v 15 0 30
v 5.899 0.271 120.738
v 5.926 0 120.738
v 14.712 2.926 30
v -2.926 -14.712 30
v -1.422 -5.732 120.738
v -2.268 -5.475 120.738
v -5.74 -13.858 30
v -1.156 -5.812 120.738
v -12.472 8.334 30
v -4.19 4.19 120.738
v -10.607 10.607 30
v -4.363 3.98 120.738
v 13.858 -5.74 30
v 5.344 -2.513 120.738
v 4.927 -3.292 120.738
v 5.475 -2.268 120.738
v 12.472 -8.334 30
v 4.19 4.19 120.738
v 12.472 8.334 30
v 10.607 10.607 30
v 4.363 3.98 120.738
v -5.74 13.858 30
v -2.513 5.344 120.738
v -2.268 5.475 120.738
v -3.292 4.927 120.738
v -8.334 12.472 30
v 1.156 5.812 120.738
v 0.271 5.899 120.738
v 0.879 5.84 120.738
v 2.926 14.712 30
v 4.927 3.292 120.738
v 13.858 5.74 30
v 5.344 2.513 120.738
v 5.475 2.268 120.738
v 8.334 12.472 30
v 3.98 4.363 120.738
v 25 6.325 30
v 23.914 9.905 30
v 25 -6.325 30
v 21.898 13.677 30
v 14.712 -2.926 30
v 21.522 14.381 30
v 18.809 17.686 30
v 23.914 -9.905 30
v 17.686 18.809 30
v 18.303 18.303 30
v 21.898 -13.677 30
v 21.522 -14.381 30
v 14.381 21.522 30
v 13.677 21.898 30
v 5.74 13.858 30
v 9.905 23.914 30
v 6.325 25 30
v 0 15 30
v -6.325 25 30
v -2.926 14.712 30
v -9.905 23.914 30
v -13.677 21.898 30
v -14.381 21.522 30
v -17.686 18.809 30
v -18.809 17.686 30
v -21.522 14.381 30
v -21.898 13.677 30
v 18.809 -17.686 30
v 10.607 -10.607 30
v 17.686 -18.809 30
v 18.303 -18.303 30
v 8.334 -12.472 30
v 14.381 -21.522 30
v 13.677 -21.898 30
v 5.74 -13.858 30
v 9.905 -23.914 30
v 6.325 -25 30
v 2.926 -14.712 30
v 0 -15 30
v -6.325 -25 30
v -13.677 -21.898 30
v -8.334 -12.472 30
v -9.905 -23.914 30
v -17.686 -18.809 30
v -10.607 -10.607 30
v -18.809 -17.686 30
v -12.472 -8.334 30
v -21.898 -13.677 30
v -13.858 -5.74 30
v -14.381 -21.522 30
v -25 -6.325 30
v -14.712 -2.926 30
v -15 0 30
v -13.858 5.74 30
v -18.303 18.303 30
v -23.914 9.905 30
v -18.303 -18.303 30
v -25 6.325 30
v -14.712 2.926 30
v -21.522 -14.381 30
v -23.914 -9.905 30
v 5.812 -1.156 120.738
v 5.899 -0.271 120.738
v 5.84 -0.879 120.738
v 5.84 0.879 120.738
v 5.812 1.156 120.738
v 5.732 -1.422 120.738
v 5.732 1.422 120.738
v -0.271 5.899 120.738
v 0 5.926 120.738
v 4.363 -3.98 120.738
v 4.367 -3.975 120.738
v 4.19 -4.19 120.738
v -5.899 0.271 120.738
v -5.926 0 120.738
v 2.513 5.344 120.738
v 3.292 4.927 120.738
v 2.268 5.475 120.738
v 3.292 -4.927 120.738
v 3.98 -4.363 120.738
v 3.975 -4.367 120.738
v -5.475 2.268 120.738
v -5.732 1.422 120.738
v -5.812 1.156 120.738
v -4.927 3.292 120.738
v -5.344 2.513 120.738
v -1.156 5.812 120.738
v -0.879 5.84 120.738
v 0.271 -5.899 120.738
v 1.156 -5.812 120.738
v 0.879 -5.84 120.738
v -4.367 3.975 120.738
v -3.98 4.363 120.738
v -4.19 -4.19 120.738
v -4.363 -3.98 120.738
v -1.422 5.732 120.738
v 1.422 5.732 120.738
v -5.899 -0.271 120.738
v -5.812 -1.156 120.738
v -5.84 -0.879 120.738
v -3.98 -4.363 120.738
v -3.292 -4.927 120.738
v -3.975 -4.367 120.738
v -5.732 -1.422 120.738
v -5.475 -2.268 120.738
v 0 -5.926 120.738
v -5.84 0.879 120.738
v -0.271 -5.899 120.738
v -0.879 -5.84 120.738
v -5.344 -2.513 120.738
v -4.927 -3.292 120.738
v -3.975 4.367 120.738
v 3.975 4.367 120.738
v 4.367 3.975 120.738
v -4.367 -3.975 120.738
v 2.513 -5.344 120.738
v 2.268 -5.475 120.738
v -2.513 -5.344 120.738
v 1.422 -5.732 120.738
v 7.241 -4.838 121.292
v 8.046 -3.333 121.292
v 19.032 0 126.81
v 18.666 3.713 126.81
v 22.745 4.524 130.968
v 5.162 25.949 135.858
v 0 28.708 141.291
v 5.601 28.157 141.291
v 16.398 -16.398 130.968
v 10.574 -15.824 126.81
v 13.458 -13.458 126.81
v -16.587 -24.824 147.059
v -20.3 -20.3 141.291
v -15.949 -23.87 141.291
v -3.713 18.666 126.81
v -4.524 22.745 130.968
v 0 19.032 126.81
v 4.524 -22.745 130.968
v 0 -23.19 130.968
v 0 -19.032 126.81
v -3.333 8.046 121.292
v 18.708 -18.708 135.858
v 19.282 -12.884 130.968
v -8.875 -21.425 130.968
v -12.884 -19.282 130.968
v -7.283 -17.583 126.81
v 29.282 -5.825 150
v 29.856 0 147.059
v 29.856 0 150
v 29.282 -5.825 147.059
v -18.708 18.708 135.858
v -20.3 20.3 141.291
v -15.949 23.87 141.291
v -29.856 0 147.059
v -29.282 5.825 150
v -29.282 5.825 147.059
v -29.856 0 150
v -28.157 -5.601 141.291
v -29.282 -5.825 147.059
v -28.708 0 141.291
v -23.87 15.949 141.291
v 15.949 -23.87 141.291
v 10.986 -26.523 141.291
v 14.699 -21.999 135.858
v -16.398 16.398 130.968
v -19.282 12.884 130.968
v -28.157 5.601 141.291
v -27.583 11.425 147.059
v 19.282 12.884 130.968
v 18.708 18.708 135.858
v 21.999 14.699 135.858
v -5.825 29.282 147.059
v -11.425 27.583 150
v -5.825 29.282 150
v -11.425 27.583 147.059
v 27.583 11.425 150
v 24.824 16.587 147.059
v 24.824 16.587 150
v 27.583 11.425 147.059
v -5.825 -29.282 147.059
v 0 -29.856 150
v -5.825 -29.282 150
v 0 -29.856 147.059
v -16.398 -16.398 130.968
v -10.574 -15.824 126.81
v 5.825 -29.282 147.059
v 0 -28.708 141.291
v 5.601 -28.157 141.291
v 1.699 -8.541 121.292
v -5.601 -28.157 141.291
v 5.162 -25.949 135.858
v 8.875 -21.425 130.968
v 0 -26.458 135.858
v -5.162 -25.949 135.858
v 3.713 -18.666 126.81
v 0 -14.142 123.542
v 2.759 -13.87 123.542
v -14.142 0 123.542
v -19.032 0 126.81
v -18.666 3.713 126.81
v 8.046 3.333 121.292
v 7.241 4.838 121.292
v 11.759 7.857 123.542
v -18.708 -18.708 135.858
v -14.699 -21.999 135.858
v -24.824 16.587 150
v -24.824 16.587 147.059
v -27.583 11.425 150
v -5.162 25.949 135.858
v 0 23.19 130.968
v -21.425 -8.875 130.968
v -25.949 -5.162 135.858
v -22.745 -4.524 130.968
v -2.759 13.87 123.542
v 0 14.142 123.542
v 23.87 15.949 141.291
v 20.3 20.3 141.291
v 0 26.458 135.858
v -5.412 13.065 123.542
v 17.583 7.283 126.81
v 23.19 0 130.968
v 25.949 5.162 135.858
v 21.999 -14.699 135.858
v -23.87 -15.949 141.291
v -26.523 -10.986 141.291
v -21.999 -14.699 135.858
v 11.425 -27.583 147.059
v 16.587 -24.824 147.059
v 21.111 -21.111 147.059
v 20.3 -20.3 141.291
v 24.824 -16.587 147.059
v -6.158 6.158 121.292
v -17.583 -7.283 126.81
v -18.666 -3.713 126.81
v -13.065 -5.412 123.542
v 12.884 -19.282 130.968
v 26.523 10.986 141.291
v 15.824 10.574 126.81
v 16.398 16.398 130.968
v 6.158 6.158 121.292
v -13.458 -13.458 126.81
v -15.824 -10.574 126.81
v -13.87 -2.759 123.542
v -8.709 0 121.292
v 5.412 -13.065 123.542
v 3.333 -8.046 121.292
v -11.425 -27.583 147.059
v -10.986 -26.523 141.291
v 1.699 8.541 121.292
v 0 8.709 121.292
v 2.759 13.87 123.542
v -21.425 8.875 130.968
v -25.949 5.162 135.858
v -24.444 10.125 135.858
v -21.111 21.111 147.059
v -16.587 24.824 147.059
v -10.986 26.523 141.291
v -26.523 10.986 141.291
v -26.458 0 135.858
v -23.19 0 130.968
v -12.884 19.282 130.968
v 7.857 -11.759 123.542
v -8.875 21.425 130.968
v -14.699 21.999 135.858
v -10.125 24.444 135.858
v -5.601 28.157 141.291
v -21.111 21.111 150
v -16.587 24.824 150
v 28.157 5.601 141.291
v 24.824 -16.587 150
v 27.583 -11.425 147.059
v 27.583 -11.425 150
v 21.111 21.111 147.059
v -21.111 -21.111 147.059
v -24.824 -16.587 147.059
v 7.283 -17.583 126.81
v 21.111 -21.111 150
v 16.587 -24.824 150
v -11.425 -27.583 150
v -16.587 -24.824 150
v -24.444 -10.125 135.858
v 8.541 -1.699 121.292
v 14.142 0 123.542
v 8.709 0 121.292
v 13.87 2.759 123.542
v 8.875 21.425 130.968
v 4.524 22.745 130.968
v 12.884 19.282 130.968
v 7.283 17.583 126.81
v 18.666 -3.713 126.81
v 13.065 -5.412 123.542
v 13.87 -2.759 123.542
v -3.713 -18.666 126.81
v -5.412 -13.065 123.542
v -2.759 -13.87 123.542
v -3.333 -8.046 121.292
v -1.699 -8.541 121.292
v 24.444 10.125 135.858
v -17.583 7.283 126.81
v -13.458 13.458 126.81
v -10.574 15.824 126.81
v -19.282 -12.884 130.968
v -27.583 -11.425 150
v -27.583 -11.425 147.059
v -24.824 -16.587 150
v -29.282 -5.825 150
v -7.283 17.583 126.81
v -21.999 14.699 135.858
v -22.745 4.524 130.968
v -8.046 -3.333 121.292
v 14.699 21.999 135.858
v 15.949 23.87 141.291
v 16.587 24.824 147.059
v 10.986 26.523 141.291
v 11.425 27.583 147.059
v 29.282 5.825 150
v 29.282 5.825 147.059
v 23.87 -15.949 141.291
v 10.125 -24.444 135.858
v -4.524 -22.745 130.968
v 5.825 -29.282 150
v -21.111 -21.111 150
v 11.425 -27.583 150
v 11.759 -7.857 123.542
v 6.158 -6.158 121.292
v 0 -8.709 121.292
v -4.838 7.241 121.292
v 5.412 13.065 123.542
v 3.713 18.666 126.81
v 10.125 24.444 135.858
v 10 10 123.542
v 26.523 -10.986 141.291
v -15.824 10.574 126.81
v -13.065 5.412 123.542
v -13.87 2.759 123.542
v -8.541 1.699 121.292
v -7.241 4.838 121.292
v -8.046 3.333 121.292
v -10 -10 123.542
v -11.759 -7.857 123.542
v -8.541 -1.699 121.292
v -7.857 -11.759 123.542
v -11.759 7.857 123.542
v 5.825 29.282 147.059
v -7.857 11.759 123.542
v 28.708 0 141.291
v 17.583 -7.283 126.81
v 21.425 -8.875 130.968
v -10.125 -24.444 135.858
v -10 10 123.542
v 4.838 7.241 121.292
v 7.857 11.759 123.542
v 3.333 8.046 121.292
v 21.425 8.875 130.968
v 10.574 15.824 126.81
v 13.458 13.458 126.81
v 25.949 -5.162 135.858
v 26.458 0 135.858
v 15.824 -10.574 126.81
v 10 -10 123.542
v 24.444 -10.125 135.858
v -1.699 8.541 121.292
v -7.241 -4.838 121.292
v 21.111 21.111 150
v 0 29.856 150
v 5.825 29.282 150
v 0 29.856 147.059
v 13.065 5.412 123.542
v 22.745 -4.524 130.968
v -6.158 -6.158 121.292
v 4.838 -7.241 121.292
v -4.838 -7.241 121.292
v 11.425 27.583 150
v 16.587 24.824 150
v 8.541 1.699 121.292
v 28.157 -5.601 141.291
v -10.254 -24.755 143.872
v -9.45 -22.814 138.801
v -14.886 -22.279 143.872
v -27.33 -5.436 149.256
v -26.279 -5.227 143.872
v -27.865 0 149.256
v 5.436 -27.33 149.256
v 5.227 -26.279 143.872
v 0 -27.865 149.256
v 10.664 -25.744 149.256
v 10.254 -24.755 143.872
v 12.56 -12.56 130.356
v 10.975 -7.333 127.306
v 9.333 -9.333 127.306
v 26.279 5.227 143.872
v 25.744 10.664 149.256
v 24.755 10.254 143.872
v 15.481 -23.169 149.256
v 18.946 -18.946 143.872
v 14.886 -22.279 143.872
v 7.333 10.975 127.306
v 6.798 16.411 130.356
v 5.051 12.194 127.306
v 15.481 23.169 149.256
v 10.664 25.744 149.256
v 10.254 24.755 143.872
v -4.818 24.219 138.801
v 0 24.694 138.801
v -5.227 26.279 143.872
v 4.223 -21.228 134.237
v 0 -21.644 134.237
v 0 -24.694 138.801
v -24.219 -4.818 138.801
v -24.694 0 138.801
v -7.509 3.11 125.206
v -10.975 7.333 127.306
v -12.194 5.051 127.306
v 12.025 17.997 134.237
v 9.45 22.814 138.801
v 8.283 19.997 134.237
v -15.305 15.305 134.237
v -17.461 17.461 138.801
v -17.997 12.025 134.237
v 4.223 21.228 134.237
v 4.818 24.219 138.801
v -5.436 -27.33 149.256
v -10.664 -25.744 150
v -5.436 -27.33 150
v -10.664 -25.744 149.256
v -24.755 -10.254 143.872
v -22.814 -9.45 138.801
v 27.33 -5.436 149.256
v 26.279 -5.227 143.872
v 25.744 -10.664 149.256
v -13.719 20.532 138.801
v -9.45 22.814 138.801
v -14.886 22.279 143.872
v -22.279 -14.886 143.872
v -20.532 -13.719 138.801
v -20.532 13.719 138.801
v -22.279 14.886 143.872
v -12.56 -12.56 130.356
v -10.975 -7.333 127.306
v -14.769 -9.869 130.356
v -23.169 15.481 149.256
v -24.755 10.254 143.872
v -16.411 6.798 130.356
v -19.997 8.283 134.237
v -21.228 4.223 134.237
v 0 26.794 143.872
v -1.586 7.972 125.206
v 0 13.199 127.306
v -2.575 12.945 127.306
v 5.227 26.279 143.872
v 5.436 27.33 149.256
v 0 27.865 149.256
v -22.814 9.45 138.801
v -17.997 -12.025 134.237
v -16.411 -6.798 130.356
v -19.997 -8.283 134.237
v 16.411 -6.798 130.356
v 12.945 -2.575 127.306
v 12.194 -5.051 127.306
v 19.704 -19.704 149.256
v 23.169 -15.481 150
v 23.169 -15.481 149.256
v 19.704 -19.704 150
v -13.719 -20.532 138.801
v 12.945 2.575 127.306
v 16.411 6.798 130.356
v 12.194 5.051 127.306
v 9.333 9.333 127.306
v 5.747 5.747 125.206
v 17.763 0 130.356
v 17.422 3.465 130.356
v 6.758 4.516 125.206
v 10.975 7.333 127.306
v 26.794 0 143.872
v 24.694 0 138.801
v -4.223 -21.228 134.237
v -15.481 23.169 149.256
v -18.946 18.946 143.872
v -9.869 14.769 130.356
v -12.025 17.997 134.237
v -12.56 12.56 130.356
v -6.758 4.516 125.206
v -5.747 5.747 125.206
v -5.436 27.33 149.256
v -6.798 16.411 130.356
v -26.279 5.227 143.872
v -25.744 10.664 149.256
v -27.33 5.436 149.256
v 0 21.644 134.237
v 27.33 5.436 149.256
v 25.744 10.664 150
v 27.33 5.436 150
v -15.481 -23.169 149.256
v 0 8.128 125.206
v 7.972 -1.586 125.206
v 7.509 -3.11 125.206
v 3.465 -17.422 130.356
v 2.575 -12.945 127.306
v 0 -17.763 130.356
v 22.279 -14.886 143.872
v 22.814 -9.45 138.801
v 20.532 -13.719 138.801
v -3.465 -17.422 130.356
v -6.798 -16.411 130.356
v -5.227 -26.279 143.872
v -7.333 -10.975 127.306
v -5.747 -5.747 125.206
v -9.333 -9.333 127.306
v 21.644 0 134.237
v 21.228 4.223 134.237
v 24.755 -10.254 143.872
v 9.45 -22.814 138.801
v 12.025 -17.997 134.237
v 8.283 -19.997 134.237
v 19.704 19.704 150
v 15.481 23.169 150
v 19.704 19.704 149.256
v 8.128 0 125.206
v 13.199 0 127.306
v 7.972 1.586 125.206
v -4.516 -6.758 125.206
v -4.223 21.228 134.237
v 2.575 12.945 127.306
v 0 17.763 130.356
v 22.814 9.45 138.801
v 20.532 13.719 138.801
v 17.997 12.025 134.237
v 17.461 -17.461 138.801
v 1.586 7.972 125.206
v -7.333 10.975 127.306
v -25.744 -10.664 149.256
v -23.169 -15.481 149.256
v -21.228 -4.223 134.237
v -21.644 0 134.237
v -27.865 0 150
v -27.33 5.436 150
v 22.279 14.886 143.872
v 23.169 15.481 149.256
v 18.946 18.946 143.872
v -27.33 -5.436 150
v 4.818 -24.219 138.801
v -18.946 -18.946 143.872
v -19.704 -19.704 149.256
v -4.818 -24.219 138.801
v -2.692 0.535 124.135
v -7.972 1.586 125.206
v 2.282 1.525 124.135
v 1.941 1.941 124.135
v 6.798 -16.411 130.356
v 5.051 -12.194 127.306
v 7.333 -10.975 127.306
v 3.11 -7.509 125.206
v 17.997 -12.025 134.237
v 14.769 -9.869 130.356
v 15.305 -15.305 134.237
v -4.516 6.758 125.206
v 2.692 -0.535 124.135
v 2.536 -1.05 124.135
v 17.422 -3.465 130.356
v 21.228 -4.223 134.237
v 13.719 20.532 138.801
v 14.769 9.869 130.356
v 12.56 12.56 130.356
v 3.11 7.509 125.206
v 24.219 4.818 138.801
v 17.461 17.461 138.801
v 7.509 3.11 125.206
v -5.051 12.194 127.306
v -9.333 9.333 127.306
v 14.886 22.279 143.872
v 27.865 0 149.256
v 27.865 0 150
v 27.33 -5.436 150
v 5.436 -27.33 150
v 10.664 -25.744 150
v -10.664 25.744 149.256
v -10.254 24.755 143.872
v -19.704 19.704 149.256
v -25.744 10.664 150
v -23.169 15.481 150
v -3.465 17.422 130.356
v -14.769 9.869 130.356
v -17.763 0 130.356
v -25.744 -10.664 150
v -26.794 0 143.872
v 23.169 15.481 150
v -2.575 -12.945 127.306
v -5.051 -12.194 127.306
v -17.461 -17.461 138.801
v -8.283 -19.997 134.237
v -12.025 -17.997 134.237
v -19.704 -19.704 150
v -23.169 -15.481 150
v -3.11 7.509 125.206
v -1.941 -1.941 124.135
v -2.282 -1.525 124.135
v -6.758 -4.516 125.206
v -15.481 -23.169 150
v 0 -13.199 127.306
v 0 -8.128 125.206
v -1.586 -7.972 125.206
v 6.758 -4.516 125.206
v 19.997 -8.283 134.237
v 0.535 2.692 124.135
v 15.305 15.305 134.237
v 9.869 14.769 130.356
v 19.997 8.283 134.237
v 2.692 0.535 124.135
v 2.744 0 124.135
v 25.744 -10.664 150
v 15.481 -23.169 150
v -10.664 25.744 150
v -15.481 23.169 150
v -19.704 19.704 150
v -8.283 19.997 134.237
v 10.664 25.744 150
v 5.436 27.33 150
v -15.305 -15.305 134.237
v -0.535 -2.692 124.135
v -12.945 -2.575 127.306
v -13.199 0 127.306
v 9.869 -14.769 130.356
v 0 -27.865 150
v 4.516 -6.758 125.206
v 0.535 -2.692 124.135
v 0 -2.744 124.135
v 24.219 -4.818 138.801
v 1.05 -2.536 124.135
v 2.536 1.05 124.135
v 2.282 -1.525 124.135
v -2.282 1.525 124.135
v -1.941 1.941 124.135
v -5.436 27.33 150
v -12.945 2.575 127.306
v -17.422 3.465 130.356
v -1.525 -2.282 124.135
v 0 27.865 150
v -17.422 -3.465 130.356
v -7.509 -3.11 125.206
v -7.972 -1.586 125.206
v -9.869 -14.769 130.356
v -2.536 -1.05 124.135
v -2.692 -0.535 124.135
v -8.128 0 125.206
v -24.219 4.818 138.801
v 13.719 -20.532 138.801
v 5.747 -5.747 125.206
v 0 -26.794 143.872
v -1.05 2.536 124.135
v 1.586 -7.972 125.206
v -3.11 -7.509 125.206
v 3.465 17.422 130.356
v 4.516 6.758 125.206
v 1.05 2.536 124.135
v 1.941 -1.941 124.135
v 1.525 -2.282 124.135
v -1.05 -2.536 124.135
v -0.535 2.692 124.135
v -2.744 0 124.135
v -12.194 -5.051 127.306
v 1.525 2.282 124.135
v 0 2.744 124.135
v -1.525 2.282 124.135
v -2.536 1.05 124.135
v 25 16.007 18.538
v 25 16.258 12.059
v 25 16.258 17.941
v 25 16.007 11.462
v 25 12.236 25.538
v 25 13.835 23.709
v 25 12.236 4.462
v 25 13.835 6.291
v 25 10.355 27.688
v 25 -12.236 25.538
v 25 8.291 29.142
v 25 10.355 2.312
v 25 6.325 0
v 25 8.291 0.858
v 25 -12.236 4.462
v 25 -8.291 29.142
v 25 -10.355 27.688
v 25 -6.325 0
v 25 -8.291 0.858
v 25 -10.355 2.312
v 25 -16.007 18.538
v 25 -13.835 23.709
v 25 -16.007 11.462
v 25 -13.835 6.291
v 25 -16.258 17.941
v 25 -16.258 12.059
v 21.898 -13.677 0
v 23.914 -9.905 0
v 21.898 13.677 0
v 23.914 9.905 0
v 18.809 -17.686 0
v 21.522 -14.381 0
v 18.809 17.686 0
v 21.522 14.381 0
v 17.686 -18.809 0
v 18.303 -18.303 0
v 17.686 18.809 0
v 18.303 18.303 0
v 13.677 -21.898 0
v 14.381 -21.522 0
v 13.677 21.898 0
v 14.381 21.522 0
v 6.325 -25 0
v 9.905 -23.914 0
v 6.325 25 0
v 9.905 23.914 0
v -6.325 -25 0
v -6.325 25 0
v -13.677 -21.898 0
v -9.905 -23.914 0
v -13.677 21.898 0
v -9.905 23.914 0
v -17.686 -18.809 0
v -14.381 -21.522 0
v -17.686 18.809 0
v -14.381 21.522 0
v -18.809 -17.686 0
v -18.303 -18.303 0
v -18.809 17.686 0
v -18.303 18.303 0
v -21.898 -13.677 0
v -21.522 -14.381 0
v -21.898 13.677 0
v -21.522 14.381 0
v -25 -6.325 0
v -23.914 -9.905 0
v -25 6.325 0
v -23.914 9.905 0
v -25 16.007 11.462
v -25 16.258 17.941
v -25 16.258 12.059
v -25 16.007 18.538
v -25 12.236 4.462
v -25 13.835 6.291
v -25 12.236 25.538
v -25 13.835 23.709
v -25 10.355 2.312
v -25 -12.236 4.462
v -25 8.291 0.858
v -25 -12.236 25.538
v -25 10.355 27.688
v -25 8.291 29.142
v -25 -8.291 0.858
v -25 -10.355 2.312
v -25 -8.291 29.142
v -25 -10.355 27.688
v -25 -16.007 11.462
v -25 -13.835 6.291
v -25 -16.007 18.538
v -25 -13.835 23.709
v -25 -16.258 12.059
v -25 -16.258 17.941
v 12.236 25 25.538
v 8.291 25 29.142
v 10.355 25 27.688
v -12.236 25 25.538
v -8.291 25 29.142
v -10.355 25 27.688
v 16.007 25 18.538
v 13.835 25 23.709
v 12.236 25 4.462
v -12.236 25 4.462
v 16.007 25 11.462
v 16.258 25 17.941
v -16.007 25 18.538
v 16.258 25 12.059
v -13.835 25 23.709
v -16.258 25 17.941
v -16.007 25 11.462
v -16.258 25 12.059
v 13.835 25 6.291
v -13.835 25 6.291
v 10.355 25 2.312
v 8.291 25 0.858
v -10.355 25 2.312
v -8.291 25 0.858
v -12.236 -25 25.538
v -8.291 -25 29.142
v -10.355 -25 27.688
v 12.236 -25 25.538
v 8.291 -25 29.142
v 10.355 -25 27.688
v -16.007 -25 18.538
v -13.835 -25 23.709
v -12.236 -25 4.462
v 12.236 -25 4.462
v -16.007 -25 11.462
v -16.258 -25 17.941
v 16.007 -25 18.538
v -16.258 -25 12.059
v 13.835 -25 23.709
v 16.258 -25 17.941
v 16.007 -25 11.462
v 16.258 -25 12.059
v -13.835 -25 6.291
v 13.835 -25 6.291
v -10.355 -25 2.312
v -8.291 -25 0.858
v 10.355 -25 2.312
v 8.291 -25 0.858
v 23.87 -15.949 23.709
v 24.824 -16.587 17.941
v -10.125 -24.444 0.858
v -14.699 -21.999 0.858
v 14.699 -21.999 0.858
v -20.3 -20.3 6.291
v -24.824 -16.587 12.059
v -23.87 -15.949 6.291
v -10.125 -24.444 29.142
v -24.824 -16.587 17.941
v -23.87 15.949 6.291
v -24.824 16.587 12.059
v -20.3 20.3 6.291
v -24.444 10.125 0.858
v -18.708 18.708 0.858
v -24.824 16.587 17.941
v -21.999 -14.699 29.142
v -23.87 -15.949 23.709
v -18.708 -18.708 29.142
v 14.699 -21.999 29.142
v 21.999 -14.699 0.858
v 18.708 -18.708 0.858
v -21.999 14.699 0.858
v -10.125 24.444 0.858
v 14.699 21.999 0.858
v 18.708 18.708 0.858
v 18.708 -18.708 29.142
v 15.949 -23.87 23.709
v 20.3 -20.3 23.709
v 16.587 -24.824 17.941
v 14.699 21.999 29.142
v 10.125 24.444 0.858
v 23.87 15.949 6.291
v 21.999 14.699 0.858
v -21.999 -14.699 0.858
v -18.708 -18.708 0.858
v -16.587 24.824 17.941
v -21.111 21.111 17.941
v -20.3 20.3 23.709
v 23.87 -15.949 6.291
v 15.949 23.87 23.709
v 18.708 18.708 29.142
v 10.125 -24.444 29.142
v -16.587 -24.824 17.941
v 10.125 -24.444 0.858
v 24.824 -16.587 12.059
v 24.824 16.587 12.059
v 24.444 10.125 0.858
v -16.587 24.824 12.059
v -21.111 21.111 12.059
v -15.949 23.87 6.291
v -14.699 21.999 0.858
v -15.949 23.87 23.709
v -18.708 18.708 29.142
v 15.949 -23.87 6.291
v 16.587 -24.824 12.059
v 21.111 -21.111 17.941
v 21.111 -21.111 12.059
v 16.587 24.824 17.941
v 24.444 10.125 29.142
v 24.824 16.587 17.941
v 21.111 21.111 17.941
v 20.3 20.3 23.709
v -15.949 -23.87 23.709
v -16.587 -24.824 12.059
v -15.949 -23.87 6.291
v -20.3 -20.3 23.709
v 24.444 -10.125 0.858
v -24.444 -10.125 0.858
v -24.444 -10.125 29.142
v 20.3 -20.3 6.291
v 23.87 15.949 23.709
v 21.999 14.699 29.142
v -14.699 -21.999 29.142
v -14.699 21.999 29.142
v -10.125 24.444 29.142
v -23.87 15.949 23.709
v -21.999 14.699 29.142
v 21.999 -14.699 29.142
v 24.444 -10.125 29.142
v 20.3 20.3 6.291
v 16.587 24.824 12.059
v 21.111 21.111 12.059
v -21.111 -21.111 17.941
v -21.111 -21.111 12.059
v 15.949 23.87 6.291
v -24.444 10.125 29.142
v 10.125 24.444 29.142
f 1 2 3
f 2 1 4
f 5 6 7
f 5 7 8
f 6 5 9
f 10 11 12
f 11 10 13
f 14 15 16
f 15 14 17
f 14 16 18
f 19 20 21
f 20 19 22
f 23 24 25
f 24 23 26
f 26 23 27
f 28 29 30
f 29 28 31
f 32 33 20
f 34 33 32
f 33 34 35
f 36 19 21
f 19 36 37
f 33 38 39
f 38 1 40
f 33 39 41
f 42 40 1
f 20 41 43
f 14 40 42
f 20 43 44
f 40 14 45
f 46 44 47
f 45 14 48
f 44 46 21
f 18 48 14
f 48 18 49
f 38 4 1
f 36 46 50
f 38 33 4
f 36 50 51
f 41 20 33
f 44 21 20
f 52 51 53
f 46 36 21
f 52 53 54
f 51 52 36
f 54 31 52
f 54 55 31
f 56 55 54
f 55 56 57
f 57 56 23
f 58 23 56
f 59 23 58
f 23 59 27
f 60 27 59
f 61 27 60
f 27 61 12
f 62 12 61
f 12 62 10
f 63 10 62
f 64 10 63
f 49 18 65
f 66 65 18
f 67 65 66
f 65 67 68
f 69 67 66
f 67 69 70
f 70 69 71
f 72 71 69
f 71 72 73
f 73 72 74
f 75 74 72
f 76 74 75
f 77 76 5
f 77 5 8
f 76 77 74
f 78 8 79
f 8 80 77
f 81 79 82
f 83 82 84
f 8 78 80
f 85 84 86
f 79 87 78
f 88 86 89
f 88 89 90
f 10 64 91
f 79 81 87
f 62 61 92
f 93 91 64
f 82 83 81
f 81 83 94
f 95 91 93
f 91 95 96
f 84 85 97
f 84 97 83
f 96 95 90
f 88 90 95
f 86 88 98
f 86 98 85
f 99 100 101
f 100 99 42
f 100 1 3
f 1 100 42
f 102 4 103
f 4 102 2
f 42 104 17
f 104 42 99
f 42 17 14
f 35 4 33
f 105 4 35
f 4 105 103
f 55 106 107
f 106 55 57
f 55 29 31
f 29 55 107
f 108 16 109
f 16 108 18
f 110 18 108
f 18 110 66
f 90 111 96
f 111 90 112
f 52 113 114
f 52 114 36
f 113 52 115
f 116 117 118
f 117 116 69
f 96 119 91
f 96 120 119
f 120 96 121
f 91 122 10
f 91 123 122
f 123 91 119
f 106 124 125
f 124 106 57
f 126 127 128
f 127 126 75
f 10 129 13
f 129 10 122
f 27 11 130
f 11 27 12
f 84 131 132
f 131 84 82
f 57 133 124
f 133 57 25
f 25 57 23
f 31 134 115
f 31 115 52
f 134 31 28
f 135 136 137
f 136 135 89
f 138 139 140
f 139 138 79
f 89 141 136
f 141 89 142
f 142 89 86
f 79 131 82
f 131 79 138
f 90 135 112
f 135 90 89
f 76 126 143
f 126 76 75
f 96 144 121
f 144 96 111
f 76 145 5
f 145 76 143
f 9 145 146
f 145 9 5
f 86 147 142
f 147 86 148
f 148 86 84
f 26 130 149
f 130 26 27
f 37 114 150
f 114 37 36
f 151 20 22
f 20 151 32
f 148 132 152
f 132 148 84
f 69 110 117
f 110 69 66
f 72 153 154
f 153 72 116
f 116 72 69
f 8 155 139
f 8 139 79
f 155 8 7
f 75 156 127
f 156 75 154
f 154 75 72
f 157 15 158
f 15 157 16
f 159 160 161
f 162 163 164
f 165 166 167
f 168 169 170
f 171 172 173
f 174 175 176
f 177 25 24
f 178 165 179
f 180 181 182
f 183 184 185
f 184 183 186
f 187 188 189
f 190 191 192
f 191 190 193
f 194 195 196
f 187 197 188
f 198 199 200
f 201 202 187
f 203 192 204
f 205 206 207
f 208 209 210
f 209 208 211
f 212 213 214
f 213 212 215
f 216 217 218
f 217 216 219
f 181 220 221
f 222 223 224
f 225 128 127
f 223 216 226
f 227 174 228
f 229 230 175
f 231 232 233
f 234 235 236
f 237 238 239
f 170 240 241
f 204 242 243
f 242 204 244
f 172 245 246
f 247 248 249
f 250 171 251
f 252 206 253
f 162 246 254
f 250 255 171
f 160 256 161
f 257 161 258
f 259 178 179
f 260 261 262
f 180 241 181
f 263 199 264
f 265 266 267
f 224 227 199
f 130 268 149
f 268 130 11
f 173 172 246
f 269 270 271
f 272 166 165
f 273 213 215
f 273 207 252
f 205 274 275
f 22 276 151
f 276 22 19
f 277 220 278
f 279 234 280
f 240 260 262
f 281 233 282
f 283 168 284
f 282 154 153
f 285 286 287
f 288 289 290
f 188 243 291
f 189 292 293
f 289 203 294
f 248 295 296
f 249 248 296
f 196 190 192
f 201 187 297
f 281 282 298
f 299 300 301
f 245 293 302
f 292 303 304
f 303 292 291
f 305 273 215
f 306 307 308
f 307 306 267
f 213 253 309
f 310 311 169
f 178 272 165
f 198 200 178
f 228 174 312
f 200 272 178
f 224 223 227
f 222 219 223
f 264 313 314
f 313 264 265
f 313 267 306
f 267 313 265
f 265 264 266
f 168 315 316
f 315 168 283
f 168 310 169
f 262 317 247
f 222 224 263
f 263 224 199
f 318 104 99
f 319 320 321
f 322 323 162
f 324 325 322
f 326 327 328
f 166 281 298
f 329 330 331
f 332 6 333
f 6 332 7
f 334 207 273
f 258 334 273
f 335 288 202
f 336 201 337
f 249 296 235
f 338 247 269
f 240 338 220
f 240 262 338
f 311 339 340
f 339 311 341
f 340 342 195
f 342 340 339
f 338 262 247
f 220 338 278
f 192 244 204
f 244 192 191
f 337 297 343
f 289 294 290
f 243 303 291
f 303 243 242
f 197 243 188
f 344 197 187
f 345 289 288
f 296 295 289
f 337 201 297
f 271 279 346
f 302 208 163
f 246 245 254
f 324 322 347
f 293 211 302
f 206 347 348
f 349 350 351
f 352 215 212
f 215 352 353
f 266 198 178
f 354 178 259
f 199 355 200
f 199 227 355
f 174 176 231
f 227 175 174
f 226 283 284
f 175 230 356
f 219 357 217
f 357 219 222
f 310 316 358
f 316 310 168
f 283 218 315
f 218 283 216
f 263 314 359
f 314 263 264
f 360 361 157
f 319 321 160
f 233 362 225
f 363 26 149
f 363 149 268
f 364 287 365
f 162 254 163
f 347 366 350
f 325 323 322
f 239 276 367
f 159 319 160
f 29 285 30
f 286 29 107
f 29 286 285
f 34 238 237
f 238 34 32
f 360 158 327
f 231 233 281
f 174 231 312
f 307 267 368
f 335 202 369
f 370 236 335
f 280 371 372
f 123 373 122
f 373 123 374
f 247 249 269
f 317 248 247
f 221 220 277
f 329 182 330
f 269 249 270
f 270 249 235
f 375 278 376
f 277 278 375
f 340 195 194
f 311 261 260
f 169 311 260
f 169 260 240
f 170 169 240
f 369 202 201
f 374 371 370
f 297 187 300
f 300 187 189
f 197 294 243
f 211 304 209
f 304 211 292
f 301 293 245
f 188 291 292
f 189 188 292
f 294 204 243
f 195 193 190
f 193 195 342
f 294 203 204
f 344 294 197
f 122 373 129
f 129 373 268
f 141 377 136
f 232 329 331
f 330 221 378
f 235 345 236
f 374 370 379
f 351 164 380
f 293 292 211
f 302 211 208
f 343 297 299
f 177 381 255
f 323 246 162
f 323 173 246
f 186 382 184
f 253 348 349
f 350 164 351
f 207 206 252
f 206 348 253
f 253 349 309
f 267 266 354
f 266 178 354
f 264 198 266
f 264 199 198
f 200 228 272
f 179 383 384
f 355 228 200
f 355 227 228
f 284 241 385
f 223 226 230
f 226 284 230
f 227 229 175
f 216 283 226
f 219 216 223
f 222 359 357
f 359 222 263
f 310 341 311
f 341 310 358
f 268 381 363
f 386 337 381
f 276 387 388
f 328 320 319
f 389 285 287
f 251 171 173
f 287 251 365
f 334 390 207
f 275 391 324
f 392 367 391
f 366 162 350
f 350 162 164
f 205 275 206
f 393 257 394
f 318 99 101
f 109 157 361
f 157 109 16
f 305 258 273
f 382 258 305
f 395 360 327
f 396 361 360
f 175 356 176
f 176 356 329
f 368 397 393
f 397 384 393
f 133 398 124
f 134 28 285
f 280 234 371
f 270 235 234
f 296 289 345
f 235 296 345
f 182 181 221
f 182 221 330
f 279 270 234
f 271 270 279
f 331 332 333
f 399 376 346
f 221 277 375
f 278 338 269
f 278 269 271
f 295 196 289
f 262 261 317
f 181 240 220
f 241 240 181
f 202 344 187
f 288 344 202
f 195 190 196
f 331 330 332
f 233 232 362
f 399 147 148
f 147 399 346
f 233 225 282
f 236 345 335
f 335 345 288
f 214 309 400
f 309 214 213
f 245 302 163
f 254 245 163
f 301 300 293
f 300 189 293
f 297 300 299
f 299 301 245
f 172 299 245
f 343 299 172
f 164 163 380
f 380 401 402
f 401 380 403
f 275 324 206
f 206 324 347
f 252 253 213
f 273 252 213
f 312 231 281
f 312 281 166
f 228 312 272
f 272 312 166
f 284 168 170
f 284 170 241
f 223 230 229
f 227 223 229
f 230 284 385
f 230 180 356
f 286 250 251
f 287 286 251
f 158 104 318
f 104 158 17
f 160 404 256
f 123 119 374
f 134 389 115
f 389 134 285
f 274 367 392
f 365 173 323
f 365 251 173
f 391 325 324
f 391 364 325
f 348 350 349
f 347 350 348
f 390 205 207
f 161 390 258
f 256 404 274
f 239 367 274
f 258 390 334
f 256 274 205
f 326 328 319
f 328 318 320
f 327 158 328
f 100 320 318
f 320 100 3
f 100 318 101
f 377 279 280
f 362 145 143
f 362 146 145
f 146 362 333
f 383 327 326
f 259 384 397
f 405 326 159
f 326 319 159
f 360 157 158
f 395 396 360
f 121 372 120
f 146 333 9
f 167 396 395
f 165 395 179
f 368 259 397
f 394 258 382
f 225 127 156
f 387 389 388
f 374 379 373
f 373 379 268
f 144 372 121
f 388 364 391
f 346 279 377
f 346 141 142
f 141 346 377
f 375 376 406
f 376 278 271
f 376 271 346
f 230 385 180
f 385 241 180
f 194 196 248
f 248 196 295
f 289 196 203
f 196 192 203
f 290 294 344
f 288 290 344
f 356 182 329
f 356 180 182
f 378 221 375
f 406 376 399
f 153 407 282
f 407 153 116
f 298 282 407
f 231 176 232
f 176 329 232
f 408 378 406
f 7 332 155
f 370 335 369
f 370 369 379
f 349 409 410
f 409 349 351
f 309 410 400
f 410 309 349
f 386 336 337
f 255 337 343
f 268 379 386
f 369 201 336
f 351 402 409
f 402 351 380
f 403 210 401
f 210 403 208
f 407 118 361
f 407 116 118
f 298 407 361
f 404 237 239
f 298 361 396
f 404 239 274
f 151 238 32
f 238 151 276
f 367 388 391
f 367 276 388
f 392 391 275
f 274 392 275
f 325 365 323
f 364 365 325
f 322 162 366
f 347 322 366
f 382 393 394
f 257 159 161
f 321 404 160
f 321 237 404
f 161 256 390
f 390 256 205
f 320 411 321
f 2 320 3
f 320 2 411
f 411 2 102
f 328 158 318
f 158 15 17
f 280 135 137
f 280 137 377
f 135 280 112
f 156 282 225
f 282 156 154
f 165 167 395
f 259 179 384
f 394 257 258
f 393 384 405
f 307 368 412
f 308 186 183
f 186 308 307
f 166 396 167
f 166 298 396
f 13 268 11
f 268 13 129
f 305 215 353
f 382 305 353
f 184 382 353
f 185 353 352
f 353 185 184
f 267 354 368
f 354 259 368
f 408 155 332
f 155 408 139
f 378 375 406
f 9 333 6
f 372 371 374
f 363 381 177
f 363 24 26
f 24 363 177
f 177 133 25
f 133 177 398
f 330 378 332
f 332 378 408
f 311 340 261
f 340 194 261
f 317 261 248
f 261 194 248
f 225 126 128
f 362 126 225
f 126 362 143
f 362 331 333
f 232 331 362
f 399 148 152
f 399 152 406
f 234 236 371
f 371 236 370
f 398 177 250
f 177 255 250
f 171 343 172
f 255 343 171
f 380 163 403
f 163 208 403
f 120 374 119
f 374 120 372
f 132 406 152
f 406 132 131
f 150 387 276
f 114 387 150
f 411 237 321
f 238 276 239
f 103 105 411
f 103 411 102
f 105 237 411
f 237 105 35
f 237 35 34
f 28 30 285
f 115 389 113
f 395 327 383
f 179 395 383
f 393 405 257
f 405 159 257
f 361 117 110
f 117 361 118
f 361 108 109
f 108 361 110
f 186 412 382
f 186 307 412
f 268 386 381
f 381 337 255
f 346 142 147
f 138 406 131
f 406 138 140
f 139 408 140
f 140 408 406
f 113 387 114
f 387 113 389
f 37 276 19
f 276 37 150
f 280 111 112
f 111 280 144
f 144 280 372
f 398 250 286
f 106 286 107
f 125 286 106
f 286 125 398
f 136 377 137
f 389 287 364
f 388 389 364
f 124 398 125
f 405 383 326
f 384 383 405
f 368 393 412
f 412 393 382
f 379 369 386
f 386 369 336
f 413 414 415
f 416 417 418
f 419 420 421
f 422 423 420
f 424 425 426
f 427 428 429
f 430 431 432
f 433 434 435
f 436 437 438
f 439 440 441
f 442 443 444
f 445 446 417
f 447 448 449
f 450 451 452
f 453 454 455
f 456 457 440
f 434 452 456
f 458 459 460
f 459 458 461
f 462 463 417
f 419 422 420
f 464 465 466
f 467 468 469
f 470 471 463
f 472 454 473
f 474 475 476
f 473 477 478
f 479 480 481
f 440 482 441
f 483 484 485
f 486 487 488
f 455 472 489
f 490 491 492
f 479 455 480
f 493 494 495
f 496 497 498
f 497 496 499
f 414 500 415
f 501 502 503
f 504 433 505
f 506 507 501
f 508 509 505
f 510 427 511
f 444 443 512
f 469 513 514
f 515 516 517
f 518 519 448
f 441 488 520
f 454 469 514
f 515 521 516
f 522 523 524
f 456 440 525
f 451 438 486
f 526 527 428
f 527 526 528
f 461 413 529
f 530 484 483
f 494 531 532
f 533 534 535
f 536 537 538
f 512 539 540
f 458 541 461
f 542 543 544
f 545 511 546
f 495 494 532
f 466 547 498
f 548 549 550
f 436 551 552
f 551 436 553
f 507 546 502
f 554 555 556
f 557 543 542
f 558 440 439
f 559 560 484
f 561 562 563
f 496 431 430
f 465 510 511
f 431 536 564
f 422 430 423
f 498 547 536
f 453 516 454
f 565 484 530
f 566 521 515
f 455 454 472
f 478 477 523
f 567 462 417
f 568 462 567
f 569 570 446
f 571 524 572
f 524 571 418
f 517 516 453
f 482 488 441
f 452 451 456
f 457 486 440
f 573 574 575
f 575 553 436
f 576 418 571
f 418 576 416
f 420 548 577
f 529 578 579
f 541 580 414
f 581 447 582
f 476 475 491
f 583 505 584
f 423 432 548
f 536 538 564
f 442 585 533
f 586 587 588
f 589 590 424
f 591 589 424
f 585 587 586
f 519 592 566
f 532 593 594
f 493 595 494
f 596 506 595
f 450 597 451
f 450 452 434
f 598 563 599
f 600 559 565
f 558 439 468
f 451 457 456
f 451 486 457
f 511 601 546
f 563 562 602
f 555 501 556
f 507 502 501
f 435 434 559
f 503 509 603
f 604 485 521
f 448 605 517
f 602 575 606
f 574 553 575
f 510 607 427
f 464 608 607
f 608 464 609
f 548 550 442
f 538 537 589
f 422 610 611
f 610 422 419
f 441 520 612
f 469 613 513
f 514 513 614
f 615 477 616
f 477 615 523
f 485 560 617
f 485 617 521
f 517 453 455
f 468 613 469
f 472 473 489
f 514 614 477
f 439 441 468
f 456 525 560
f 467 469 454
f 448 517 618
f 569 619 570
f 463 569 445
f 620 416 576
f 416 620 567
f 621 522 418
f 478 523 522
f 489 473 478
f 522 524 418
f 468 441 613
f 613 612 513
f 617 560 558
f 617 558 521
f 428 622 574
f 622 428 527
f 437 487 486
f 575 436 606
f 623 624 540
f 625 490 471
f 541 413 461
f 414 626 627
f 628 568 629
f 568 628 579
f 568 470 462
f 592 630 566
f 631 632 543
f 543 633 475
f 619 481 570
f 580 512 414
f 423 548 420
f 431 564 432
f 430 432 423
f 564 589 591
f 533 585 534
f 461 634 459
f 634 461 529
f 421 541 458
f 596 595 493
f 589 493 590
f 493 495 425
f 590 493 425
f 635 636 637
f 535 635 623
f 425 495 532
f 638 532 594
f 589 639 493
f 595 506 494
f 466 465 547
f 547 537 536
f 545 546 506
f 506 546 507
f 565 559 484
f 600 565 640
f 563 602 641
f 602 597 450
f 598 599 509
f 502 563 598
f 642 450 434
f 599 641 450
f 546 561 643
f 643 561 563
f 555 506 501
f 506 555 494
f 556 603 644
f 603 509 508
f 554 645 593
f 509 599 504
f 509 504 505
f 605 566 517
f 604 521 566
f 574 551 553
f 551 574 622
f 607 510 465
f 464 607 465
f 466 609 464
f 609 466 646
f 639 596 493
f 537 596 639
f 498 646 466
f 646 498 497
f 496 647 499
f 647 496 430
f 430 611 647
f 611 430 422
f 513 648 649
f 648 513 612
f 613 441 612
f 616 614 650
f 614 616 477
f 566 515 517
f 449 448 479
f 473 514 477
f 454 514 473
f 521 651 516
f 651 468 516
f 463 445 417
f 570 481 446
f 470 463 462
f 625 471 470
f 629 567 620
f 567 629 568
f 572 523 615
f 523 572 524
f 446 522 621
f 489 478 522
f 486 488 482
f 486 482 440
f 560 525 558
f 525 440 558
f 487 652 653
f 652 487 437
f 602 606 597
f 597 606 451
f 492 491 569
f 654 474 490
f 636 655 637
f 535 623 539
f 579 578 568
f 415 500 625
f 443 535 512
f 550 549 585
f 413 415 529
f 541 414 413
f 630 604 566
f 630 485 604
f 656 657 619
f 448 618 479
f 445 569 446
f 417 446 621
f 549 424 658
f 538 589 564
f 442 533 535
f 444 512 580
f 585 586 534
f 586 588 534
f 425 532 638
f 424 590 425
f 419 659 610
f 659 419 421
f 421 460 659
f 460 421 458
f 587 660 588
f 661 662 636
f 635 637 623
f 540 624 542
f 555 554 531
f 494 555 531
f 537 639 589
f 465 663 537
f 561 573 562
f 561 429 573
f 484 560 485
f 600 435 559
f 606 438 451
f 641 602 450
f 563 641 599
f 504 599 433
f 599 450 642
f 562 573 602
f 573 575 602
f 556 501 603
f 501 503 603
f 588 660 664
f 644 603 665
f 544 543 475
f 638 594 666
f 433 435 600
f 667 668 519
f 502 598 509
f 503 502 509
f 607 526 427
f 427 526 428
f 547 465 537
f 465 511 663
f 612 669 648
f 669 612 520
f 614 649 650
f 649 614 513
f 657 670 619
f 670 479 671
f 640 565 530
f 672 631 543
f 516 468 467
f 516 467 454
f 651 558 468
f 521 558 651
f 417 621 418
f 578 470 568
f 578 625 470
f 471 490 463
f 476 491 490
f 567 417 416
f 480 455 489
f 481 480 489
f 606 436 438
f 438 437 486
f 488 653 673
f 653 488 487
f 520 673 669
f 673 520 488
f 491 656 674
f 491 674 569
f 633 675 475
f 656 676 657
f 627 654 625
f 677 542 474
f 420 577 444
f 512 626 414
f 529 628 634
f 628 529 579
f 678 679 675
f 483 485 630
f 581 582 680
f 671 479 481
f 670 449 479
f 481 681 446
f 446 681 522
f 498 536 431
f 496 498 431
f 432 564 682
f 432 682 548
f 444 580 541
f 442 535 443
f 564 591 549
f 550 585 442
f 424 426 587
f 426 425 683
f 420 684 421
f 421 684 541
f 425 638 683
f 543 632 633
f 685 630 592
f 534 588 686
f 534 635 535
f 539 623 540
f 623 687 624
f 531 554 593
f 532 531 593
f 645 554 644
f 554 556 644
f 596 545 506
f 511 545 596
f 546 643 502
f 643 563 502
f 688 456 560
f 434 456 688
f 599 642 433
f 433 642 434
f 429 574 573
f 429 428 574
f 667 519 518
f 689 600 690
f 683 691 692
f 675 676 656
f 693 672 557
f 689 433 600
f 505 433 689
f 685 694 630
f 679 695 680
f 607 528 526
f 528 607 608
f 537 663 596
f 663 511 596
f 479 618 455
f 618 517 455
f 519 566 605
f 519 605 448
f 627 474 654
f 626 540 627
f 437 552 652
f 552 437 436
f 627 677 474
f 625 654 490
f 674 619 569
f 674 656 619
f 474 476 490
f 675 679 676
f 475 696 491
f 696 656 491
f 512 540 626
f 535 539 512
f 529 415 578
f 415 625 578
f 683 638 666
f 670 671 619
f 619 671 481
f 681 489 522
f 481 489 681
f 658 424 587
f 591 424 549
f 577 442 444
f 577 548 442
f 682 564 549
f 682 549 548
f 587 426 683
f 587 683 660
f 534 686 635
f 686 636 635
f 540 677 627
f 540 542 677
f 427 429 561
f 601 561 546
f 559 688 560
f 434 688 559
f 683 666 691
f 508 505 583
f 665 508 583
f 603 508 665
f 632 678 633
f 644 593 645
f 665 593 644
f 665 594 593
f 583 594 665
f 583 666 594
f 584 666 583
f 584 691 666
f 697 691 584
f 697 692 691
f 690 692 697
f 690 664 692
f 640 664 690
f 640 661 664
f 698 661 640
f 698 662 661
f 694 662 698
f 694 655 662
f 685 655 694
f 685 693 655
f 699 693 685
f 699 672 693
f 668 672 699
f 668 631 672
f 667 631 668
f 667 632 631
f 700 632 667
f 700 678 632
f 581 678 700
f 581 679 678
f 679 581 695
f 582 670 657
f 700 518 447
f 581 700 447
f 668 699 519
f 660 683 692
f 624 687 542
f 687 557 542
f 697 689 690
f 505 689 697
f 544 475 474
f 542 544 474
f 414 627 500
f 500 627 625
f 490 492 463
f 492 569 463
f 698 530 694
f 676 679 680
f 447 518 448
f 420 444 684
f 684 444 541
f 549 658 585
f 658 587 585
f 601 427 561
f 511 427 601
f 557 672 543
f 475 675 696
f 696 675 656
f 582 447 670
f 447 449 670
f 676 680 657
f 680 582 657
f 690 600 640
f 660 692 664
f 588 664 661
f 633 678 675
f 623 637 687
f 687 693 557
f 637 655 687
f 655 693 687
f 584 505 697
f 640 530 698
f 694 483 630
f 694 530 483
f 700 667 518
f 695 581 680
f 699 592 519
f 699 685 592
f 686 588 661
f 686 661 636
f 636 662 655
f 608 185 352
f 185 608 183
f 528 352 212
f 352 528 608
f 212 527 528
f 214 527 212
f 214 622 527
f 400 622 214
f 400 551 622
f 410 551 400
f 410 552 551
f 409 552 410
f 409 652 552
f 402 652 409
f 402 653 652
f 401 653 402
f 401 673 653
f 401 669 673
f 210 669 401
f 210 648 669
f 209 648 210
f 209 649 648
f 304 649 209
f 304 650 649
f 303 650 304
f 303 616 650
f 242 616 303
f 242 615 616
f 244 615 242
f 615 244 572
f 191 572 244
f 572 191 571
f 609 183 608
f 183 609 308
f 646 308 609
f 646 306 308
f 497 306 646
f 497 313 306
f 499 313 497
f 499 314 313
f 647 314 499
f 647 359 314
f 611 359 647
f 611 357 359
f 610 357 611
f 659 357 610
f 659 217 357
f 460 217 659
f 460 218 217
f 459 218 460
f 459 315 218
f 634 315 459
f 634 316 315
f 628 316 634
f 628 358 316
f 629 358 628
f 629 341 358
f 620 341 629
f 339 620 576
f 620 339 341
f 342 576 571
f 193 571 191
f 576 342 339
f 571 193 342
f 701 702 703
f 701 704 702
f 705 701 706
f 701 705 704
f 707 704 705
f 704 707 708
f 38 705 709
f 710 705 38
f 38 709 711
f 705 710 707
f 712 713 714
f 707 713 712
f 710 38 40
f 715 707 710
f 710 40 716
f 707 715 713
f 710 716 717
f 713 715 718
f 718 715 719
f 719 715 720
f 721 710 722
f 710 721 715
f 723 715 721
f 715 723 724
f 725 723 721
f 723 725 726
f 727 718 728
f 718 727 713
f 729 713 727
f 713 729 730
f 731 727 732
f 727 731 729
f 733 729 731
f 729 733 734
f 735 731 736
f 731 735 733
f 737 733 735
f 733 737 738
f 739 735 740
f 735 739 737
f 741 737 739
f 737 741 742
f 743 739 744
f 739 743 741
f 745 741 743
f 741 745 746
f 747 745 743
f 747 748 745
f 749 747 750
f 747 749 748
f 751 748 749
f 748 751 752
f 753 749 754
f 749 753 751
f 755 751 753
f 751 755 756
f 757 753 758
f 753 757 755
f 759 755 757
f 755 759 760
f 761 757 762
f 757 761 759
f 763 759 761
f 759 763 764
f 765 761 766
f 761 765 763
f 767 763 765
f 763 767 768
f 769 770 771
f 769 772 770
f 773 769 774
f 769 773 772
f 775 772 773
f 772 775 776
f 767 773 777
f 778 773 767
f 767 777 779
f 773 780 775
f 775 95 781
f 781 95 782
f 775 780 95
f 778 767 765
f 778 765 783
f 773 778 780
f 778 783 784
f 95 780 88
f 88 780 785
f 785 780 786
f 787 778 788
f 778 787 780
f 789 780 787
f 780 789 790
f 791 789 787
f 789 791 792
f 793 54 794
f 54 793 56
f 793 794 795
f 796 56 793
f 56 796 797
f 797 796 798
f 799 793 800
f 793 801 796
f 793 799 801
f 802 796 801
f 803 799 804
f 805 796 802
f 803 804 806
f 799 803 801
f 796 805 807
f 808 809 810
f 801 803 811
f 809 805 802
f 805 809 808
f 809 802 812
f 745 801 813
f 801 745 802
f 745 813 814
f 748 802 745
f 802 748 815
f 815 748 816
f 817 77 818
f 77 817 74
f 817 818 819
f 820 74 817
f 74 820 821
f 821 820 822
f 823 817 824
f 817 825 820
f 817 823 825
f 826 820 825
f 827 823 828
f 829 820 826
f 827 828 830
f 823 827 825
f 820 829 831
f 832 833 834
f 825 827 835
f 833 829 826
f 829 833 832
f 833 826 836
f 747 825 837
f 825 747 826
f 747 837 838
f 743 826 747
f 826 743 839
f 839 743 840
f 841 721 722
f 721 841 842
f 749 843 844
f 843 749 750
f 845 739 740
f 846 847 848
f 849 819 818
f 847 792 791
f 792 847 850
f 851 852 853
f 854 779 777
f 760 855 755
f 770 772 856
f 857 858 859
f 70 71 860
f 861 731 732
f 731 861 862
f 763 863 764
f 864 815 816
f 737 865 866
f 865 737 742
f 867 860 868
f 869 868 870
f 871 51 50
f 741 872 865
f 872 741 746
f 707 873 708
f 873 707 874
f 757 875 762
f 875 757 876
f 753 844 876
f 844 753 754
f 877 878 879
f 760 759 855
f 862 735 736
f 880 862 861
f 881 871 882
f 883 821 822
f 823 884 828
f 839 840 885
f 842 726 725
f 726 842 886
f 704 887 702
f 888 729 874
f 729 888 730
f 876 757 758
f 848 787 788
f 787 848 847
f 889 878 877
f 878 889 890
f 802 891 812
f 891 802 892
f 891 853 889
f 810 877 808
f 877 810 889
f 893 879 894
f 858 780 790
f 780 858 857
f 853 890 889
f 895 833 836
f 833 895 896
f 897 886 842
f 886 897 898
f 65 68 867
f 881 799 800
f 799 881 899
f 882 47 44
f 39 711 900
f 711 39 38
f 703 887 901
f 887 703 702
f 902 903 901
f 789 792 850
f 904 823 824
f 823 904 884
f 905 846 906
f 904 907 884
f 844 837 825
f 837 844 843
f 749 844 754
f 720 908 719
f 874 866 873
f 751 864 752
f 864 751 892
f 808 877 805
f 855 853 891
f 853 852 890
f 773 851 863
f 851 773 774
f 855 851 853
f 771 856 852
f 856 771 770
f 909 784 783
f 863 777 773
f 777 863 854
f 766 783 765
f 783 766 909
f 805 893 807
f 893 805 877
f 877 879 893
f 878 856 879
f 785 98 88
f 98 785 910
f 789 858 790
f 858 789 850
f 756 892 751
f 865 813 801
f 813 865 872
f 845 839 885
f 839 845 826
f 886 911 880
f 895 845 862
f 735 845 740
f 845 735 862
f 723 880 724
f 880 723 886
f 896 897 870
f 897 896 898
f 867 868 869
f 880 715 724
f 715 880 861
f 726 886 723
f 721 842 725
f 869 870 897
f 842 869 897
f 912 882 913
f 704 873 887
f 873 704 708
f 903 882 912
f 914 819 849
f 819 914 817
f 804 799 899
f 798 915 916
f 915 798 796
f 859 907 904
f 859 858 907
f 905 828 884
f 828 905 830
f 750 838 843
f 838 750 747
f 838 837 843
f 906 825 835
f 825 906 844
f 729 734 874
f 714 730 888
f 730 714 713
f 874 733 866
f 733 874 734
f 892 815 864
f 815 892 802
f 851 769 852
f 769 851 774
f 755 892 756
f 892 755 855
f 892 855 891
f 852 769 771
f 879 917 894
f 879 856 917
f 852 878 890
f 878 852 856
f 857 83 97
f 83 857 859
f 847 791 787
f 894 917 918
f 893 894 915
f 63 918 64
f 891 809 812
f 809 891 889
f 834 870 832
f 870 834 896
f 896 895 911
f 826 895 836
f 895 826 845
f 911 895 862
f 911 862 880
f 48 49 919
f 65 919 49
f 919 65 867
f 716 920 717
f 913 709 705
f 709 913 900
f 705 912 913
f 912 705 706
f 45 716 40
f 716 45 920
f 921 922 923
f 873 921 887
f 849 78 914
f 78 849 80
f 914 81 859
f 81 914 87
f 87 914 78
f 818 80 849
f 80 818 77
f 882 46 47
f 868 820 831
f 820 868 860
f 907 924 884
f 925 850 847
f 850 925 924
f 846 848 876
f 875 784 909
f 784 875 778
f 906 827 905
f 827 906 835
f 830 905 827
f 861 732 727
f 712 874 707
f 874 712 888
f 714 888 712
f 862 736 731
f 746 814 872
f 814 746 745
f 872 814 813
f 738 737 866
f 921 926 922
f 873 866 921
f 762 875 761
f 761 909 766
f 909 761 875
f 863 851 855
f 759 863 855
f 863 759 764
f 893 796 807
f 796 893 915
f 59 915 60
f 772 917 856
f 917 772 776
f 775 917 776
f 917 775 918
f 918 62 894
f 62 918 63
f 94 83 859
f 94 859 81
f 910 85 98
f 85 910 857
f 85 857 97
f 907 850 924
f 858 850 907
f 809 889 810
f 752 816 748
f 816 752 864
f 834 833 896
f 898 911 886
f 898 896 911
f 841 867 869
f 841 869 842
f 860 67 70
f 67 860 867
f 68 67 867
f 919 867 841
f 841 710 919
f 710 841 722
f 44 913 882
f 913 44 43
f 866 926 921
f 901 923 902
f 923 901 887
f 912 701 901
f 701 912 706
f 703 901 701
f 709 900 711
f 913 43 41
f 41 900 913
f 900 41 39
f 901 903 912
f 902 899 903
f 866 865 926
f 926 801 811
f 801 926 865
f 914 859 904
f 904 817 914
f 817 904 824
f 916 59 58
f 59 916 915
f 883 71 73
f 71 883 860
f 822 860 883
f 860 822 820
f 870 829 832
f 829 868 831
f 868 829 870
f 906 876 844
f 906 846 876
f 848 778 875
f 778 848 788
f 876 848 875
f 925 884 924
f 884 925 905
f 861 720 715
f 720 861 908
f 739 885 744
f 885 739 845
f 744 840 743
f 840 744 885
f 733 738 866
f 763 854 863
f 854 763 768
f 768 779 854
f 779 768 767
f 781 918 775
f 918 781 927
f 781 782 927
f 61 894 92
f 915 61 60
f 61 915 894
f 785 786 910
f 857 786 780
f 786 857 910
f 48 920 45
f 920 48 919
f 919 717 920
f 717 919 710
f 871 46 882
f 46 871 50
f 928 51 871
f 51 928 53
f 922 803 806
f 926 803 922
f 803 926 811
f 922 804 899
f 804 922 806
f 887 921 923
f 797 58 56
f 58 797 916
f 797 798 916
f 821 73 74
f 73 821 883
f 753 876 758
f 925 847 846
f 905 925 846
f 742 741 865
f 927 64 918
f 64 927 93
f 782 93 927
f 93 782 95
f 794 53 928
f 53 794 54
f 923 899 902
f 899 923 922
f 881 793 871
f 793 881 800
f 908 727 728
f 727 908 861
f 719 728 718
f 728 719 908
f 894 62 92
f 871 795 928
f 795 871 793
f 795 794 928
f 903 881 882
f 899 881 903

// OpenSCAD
// Basiskurs OpenSCAD
// pokal.scad
// (c) berlincreators.de

$fn=32; // [6:2:100]

difference() {
    union() {
        translate([0,0,30]) cylinder(d2=10, d1=30, h=100);
        translate([0,0,150]) sphere(d=60);
    }
    translate([0,0,152]) sphere(d=56);
    translate([0,0,180]) cube(60, center=true);
}

intersection() {
    translate([0,0,15]) cube([50,50,30], center=true);
    translate([0,0,15]) sphere(d=60);
}    
